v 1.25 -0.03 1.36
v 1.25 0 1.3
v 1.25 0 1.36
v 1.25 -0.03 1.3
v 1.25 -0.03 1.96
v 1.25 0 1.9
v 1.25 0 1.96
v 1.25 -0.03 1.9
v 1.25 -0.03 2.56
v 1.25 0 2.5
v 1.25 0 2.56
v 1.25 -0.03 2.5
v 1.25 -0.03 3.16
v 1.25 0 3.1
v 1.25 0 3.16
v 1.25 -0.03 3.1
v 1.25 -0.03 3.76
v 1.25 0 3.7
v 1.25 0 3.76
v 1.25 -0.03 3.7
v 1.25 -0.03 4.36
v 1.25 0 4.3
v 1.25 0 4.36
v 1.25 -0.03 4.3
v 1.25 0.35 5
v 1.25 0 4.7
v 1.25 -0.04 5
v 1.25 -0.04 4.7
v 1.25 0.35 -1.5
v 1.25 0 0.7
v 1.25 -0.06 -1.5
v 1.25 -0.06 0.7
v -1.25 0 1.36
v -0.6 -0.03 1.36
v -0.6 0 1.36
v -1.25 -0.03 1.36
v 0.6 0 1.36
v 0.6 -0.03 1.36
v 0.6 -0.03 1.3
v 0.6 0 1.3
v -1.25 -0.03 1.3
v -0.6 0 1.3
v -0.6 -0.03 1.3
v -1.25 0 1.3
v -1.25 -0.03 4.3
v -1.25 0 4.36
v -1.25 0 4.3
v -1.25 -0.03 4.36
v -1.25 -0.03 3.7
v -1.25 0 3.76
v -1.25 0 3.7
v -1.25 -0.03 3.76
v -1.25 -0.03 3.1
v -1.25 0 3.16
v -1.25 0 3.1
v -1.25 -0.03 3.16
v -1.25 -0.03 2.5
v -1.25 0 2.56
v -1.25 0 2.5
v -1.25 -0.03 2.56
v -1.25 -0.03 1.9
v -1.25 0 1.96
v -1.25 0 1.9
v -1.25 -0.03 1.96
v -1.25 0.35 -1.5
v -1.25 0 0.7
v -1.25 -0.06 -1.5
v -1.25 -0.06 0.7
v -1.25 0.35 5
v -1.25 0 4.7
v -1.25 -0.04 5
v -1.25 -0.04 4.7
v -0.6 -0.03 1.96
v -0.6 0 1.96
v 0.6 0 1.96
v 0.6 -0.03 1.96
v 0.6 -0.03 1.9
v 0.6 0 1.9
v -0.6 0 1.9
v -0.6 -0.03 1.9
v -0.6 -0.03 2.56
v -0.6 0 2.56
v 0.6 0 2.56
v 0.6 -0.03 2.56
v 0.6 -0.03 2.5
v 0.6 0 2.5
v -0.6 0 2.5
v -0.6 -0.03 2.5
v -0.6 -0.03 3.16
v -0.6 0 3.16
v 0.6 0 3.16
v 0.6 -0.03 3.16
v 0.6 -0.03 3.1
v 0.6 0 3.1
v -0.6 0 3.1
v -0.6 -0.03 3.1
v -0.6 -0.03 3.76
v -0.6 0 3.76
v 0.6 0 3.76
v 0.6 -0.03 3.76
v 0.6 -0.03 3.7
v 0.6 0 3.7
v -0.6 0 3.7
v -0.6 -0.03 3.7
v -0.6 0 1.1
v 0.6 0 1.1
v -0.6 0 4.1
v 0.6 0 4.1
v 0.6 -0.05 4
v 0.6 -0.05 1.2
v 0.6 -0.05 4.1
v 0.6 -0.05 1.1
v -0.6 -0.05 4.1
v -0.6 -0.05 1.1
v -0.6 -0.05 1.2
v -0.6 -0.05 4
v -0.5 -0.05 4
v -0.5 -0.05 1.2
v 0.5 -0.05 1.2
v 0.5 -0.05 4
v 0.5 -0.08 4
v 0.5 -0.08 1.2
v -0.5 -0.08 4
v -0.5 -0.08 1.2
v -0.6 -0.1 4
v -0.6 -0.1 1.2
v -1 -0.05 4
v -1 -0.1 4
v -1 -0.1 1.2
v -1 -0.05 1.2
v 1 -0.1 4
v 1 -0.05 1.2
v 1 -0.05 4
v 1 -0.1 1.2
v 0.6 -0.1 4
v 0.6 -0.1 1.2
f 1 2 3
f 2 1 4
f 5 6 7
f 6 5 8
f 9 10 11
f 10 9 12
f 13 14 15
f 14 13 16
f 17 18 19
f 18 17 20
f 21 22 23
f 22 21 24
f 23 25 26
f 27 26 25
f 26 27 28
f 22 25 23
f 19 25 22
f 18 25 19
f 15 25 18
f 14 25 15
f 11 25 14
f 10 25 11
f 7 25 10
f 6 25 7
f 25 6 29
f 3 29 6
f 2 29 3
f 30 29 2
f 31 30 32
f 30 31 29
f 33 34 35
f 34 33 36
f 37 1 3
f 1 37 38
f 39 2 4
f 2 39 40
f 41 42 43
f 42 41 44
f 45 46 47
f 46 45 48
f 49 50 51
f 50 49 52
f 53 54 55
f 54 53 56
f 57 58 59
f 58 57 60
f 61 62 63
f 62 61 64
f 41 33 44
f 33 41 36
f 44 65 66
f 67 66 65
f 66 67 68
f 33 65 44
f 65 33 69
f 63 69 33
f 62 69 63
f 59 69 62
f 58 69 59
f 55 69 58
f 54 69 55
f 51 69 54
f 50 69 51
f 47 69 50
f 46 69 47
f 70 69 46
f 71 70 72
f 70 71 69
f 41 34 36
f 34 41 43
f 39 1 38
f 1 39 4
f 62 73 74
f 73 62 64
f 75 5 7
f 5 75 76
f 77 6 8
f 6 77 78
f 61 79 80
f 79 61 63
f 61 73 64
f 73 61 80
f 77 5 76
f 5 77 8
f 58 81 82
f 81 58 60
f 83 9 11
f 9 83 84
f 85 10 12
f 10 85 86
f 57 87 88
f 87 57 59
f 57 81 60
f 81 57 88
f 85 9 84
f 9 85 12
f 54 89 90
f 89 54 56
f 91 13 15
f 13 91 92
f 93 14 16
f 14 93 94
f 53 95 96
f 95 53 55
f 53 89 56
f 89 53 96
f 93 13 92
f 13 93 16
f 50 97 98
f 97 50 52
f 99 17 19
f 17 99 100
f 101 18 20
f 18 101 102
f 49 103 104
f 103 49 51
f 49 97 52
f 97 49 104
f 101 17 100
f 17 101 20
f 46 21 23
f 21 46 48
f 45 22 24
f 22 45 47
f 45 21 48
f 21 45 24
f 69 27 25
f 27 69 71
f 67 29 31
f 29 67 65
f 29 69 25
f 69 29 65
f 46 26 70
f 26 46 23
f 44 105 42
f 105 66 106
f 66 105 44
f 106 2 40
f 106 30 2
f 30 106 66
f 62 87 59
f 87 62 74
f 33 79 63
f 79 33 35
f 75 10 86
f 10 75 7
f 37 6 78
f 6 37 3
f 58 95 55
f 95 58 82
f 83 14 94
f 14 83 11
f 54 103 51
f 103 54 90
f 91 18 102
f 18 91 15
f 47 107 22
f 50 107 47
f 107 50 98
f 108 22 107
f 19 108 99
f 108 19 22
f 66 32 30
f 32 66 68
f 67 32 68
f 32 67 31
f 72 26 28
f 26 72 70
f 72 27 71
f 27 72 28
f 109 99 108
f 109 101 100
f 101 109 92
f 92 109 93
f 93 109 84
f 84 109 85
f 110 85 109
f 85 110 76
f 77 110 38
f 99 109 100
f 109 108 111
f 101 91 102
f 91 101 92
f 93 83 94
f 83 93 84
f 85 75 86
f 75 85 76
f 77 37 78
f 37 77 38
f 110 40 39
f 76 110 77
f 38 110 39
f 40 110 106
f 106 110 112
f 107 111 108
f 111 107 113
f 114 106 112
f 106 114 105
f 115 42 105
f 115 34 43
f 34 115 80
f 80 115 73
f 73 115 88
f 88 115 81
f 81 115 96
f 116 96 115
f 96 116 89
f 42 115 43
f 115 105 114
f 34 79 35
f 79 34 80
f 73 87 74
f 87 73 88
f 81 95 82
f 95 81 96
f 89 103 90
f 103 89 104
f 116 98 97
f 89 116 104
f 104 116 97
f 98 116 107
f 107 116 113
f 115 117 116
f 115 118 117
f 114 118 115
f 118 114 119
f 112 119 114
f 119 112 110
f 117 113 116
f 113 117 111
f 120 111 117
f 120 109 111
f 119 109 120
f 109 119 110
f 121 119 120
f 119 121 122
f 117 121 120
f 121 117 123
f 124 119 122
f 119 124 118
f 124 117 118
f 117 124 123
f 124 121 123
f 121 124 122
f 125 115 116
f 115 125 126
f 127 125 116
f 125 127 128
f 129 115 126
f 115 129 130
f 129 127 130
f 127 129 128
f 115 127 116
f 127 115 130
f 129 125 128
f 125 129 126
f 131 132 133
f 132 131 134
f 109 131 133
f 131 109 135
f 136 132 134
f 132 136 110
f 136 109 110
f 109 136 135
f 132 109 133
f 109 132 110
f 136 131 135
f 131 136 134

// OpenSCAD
// file: lib/lodge_kit.scad
// Lodge shell tile kit — shared dimensions and modules.
//
// The game paints a lodge footprint in 5 m cells and resolves the
// exterior from these tiles at half-cell (2.5 m) resolution; see
// internal/world/lodge_shell.go. Every tile is authored in the same
// canonical frame:
//
//   * origin on the lodge floor plane (Z = 0);
//   * wall-type tiles sit on a footprint edge, centred on it, with the
//     OUTSIDE toward SCAD −Y (game +Z) and the wall thickness toward +Y;
//   * roof tiles are centred on a half-cell, with Z = 0 at the tile's
//     lowest corner; slopes fall toward −Y (game +Z);
//   * corner tiles sit on a grid vertex; an outer corner's building is
//     in the SCAD (−X, +Y) quadrant, an inner corner's notch in (+X, −Y).
//
// Colours are near-neutral: the renderer tints walls and roofs per lodge
// from a seeded palette (world.ShellPalette).
//
// Keep these in sync with the constants in lodge_shell.go.

tile   = 2.5;   // ShellTileSize
wall_h = 5.0;   // ShellWallHeight
rise   = 2.1;   // ShellRoofRise, per tile of run
pitch  = rise / tile;

wall_t   = 0.35;  // wall thickness
sink     = 1.5;   // walls run this far below the floor to hide pad grading
roof_t   = 0.25;  // roof slab thickness
overhang = 0.7;   // eaves overhang past the wall plane

c_wall   = [0.92, 0.90, 0.86];
c_stone  = [0.62, 0.61, 0.60];
c_trim   = [0.97, 0.97, 0.95];
c_glass  = [0.30, 0.42, 0.52];
c_door   = [0.36, 0.25, 0.18];
c_roof   = [0.97, 0.97, 0.97];
c_fascia = [0.55, 0.52, 0.50];

// Plain wall panel: timber above a stone plinth, a trim band under the
// eaves.
module wall_panel() {
    color(c_wall)
        translate([-tile/2, 0, -sink]) cube([tile, wall_t, wall_h + sink]);
    color(c_stone)
        translate([-tile/2, -0.06, -sink]) cube([tile, wall_t, sink + 0.7]);
    color(c_trim)
        translate([-tile/2, -0.04, wall_h - 0.3]) cube([tile, 0.1, 0.3]);
    battens();
}

// Horizontal board lines above the plinth.
module battens() {
    color(c_wall * 0.8)
        for (z = [1.3 : 0.6 : wall_h - 0.6])
            translate([-tile/2, -0.03, z]) cube([tile, 0.04, 0.06]);
}

// A framed pane on the outer face. x0/w along the wall, z0/h up it.
module pane(x0, w, z0, h) {
    color(c_trim)
        translate([x0 - 0.1, -0.05, z0 - 0.1]) cube([w + 0.2, 0.06, h + 0.2]);
    color(c_glass)
        translate([x0, -0.08, z0]) cube([w, 0.06, h]);
}

module wall_window() {
    wall_panel();
    pane(-0.7, 1.4, 1.4, 2.2);
    color(c_trim) translate([-0.02, -0.1, 1.4]) cube([0.04, 0.04, 2.2]); // mullion
}

// Tall window flanked by shutters.
module wall_window_alt() {
    wall_panel();
    pane(-0.5, 1.0, 1.2, 2.8);
    color(c_door) {
        translate([-1.0, -0.1, 1.2]) cube([0.4, 0.05, 2.8]);
        translate([ 0.6, -0.1, 1.2]) cube([0.4, 0.05, 2.8]);
    }
}

// Floor-to-eave glazing for food courts: a low stone sill, then glass in
// three lights.
module wall_glazed() {
    color(c_wall)
        translate([-tile/2, 0, -sink]) cube([tile, wall_t, wall_h + sink]);
    color(c_stone)
        translate([-tile/2, -0.06, -sink]) cube([tile, wall_t, sink + 0.35]);
    color(c_glass)
        translate([-tile/2, -0.09, 0.35]) cube([tile, 0.06, wall_h - 0.75]);
    color(c_trim) {
        for (x = [-tile/2, -tile/6, tile/6, tile/2 - 0.08])
            translate([x, -0.12, 0.35]) cube([0.08, 0.06, wall_h - 0.75]);
        translate([-tile/2, -0.12, wall_h - 0.45]) cube([tile, 0.07, 0.1]);
    }
}

// Glazed entry door under a small canopy, with a step.
module door() {
    color(c_wall)
        translate([-tile/2, 0, -sink]) cube([tile, wall_t, wall_h + sink]);
    color(c_stone)
        translate([-tile/2, -0.06, -sink]) cube([tile, wall_t, sink + 0.15]);
    battens();
    color(c_door)
        translate([-0.9, -0.1, 0]) cube([1.8, 0.1, 2.7]);
    color(c_glass) {
        translate([-0.75, -0.13, 0.9]) cube([0.65, 0.05, 1.6]);
        translate([ 0.10, -0.13, 0.9]) cube([0.65, 0.05, 1.6]);
    }
    color(c_trim)
        translate([-tile/2, -0.04, wall_h - 0.3]) cube([tile, 0.1, 0.3]);
    color(c_roof)   // canopy
        translate([-1.2, -1.3, 3.0])
            rotate([-12, 0, 0]) cube([2.4, 1.3, 0.12]);
    color(c_stone)  // step
        translate([-1.1, -0.9, -0.3]) cube([2.2, 0.9, 0.42]);
}

module corner_outer() {
    color(c_stone)
        translate([-0.3, -0.05, -sink]) cube([0.35, 0.35, wall_h + sink - 0.3]);
}

module corner_inner() {
    color(c_trim)
        translate([0, -0.12, 0]) cube([0.12, 0.12, wall_h - 0.3]);
}

// Roof slab over one half-cell. h lists corner heights (in rise units)
// in SCAD order (−X,+Y), (+X,+Y), (+X,−Y), (−X,−Y); split names which
// diagonal the top surface folds along: 0 through corners 0–2, 1
// through corners 1–3.
module roof_tile(h, split) {
    p = [[-tile/2, tile/2], [tile/2, tile/2], [tile/2, -tile/2], [-tile/2, -tile/2]];
    top = [for (i = [0:3]) [p[i][0], p[i][1], h[i] * rise]];
    bot = [for (i = [0:3]) [p[i][0], p[i][1], h[i] * rise - roof_t]];
    tris = split == 0 ? [[0, 1, 2], [0, 2, 3]] : [[0, 1, 3], [1, 2, 3]];
    color(c_roof)
        polyhedron(
            points = concat(top, bot),
            faces = concat(
                // top (clockwise seen from above = outward in OpenSCAD)
                [for (t = tris) [t[0], t[1], t[2]]],
                [for (t = tris) [t[2] + 4, t[1] + 4, t[0] + 4]],
                [for (i = [0:3]) [i, i + 4, (i + 1) % 4 + 4, (i + 1) % 4]]
            ));
}

// Eaves strip past a wall edge: continues the roof plane outward and
// down, finished with a fascia board.
module eave() {
    drop = overhang * pitch;
    color(c_roof)
        polyhedron(
            points = [
                [-tile/2, 0, 0], [tile/2, 0, 0], [tile/2, -overhang, -drop], [-tile/2, -overhang, -drop],
                [-tile/2, 0, -roof_t], [tile/2, 0, -roof_t], [tile/2, -overhang, -drop - roof_t], [-tile/2, -overhang, -drop - roof_t],
            ],
            faces = [[0, 1, 2, 3], [7, 6, 5, 4], [0, 4, 5, 1], [1, 5, 6, 2], [2, 6, 7, 3], [3, 7, 4, 0]]);
    color(c_fascia)
        translate([-tile/2, -overhang - 0.05, -drop - roof_t - 0.1]) cube([tile, 0.08, roof_t + 0.2]);
}

// Eaves in the square past an outer corner: a hip folding along the
// diagonal away from the building.
module eave_corner() {
    o = overhang;
    d = o * pitch;
    color(c_roof)
        polyhedron(
            points = [
                [0, 0, 0], [o, 0, -d], [o, -o, -d], [0, -o, -d],
                [0, 0, -roof_t], [o, 0, -d - roof_t], [o, -o, -d - roof_t], [0, -o, -d - roof_t],
            ],
            faces = [[0, 1, 2], [0, 2, 3], [6, 5, 4], [7, 6, 4], [0, 4, 5, 1], [1, 5, 6, 2], [2, 6, 7, 3], [3, 7, 4, 0]]);
    color(c_fascia) {
        translate([0, -o - 0.05, -d - roof_t - 0.1]) cube([o + 0.05, 0.08, roof_t + 0.2]);
        translate([o - 0.03, -o - 0.05, -d - roof_t - 0.1]) cube([0.08, o + 0.05, roof_t + 0.2]);
    }
}

module chimney() {
    color(c_stone)
        translate([-0.55, -0.55, -1.0]) cube([1.1, 1.1, rise + 3.0]);
    color(c_fascia)
        translate([-0.65, -0.65, rise + 1.8]) cube([1.3, 1.3, 0.2]);
}
// main file
// Lodge shell kit: wall with a shuttered window. See lib/lodge_kit.scad.
include <lib/lodge_kit.scad>
wall_window_alt();
